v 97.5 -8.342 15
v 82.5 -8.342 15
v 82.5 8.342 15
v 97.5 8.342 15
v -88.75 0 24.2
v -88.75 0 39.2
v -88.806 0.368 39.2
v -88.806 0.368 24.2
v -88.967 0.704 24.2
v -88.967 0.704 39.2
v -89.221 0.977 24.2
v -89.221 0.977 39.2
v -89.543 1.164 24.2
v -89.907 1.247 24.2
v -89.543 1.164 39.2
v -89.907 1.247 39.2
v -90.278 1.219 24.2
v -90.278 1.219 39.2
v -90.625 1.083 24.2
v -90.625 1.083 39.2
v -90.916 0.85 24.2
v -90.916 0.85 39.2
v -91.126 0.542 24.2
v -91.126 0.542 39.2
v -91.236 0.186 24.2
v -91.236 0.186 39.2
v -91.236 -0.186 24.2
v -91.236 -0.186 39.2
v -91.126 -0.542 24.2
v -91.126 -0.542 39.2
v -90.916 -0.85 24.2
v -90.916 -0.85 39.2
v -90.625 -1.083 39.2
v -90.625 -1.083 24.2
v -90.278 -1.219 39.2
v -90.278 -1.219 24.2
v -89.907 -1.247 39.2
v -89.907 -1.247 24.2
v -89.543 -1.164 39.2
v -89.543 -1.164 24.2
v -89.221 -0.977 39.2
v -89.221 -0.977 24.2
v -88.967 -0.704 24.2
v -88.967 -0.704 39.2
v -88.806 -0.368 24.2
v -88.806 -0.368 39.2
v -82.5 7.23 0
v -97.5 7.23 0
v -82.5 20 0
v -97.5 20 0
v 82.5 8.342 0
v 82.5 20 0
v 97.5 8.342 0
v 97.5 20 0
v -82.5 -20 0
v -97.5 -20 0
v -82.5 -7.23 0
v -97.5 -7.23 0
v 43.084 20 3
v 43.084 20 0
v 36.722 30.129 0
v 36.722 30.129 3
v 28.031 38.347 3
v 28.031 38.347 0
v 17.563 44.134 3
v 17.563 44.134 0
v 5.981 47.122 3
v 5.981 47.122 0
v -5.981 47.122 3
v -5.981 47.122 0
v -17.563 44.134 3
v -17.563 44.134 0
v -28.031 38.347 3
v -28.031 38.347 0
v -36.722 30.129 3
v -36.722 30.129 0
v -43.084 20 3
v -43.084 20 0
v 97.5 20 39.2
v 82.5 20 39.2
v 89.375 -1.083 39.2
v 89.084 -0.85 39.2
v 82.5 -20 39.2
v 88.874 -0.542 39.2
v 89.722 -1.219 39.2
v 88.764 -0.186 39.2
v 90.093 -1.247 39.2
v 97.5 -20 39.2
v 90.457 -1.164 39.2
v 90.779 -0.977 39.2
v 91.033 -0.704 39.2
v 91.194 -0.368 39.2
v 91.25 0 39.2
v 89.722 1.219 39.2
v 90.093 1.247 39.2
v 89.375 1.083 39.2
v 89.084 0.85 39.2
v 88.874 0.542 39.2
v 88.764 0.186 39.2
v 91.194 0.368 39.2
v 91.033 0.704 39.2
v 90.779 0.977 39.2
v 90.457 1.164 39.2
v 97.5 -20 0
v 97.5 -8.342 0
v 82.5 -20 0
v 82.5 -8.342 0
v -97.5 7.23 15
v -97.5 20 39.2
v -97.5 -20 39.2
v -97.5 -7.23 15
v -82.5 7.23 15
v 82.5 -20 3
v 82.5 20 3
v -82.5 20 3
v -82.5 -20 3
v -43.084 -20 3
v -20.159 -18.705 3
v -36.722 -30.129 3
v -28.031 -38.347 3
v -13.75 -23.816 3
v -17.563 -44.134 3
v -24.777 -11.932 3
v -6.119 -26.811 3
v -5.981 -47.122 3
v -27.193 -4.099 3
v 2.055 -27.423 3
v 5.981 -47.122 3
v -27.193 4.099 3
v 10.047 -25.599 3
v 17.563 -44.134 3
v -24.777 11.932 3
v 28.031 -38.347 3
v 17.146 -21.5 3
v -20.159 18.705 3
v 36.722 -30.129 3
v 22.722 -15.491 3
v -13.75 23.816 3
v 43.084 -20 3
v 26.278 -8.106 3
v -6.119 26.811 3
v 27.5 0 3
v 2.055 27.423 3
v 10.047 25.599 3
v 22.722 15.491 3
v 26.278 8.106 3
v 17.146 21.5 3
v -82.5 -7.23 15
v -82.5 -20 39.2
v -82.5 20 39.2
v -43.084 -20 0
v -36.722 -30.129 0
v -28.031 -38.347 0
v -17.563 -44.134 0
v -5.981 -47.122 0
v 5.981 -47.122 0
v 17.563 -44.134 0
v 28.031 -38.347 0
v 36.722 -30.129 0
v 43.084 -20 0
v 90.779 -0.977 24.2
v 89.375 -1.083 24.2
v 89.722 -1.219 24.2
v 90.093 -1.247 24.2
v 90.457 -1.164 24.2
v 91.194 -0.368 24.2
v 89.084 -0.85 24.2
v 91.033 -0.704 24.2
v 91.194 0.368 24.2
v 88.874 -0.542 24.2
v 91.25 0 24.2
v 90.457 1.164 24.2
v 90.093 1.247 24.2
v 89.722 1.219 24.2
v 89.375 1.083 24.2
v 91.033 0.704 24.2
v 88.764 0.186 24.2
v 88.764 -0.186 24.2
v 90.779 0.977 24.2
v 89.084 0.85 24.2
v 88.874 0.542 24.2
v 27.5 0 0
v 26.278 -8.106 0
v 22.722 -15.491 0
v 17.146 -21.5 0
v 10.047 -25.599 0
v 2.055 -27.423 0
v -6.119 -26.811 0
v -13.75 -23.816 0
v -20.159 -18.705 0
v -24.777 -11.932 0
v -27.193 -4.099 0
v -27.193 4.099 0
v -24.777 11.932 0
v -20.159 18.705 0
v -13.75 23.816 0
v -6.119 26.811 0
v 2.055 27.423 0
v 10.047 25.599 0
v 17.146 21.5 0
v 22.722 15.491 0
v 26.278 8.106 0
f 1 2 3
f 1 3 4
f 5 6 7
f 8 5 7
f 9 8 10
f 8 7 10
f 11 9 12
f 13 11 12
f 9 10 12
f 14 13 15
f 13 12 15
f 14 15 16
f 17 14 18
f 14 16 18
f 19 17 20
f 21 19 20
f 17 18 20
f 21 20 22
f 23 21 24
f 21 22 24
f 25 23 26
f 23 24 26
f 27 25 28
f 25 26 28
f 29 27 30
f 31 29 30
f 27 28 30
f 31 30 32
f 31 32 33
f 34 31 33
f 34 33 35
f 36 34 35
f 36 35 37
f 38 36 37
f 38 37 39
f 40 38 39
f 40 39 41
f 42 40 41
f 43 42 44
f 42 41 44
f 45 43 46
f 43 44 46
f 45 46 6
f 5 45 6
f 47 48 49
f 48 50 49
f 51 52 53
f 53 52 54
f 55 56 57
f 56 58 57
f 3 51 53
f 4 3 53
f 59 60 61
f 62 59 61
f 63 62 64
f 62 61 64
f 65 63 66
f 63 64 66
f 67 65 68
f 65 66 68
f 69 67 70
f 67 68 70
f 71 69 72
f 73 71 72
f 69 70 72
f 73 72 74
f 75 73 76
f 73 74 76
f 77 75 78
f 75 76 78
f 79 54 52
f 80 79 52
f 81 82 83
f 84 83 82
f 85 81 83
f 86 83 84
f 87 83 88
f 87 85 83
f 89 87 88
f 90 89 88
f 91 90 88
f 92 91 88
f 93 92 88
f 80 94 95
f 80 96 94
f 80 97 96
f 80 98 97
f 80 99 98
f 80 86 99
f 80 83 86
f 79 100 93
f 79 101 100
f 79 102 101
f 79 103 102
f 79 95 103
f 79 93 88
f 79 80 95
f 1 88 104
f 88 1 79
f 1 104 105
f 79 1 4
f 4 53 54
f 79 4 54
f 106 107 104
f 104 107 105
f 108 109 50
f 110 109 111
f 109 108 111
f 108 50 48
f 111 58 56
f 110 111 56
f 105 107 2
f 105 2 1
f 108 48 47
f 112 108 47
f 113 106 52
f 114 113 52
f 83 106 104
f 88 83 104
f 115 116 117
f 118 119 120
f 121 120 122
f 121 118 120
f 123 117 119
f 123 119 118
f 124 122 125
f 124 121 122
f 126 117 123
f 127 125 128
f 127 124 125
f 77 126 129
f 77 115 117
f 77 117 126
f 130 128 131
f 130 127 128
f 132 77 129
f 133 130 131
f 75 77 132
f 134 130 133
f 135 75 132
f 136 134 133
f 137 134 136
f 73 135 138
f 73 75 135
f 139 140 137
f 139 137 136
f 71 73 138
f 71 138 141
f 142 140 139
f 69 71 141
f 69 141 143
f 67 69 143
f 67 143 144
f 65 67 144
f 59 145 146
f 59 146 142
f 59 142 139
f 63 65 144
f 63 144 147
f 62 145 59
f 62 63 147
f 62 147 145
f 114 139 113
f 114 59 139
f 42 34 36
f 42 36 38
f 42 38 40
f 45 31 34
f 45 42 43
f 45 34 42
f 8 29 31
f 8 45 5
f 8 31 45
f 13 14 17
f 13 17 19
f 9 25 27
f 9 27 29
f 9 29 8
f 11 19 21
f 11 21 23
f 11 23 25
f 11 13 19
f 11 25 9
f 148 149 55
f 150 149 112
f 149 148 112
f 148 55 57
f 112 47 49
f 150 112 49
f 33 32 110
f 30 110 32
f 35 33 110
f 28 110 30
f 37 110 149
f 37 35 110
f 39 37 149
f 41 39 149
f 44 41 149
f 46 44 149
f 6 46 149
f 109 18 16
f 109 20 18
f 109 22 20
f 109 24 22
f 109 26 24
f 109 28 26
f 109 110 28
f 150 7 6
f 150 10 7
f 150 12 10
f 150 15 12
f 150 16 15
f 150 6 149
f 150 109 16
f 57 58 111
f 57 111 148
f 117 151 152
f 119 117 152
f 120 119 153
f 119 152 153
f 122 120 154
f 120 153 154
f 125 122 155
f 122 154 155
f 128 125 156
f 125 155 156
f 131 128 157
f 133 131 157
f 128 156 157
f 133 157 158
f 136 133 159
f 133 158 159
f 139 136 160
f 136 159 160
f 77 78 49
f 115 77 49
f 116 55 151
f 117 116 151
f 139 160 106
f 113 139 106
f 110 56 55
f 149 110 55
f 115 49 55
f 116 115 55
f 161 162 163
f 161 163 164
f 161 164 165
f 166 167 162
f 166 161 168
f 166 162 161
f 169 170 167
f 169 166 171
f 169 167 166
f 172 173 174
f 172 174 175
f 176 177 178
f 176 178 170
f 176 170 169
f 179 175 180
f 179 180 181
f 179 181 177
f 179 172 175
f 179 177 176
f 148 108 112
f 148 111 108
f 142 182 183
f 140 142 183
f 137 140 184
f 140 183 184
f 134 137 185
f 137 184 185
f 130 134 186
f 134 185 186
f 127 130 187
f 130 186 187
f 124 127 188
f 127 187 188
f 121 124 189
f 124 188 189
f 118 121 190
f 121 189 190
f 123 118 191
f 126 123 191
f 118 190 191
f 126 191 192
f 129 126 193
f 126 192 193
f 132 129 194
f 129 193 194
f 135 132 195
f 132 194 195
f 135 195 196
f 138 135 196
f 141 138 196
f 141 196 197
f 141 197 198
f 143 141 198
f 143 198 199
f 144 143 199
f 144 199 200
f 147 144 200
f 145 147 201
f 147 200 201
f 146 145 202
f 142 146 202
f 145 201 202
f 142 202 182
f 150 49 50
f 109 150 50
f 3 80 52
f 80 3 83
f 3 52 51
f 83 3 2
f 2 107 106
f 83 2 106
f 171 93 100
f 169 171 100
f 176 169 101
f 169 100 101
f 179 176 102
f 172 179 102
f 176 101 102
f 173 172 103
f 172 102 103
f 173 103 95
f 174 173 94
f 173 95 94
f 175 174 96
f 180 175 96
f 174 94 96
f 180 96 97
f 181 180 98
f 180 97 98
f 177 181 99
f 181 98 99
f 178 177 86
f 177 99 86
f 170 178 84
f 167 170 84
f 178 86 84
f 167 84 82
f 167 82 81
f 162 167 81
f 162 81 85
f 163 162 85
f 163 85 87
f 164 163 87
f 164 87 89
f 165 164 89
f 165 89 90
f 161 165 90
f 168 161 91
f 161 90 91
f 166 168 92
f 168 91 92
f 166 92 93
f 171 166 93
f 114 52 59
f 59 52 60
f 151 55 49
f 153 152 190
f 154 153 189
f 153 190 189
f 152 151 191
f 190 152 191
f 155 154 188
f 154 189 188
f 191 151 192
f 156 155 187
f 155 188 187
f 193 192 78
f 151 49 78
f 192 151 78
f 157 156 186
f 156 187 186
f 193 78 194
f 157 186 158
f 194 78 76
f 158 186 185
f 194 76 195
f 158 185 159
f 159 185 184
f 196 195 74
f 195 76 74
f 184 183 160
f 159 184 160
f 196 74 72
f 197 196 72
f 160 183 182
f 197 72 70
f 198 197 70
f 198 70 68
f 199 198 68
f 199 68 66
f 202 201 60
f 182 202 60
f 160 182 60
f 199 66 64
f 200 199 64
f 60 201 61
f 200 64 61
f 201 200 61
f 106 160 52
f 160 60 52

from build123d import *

# Parameters (mm, degrees)
F1_DEPTH  = 39.2
F2_DEPTH  = 3
F3_W      = 15
F3_H      = 7.229873
F4_DEPTH  = 15
F5_W      = 15
F5_H      = 8.342162
F6_DEPTH  = 15
F7_R      = 1.25
F8_DEPTH  = 15
F9_R      = 1.25
F10_DEPTH = 15


with BuildPart() as f1:
    # F0 (on Top) → F1 (new body)
    with BuildSketch(Plane.XY):
        Polygon((-82.5, -20), (-82.5, 0), (-82.5, 20), (-97.5, 20), (-97.5, -20), align=None)
        Polygon((82.5, 20), (82.5, 0), (82.5, -20), (97.5, -20), (97.5, 20), align=None)
    extrude(amount=F1_DEPTH)

    # F3 (on face) → F4 (cut)
    with BuildSketch(Plane(origin=(0, 0, 0), x_dir=(1, 0, 0), z_dir=(0, 0, -1))):
        with Locations((-90, -3.614936)):
            Rectangle(F3_W, F3_H)
        with Locations((-90, 3.614936)):
            Rectangle(F3_W, F3_H)
    extrude(amount=-F4_DEPTH, mode=Mode.SUBTRACT)

    # F5 (on face) → F6 (cut)
    with BuildSketch(Plane(origin=(0, 0, 0), x_dir=(1, 0, 0), z_dir=(0, 0, -1))):
        with Locations((90, 4.171081)):
            Rectangle(F5_W, F5_H)
        with Locations((90, -4.171081)):
            Rectangle(F5_W, F5_H)
    extrude(amount=-F6_DEPTH, mode=Mode.SUBTRACT)

    # F7 (on face) → F8 (cut)
    with BuildSketch(Plane.XY.offset(39.2)):
        with Locations((-90, 0)):
            Circle(F7_R)
    extrude(amount=-F8_DEPTH, mode=Mode.SUBTRACT)

    # F9 (on face) → F10 (cut)
    with BuildSketch(Plane.XY.offset(39.2)):
        with Locations((90, 0)):
            Circle(F9_R)
    extrude(amount=-F10_DEPTH, mode=Mode.SUBTRACT)


with BuildPart() as f2:
    # F0 (on Top) → F2 (new body)
    with BuildSketch(Plane.XY):
        with BuildLine():
            ThreePointArc((43.08422, 20), (46.38292, 10.240839), (47.5, 0))
            Line((47.5, 0), (82.5, 0))
            Line((82.5, 0), (82.5, 20))
            Line((82.5, 20), (43.08422, 20))
        make_face()
        with BuildLine():
            Line((82.5, 0), (47.5, 0))
            ThreePointArc((47.5, 0), (46.38292, -10.240839), (43.08422, -20))
            Line((43.08422, -20), (82.5, -20))
            Line((82.5, -20), (82.5, 0))
        make_face()
        with BuildLine():
            ThreePointArc((-27.5, 0), (0, 27.5), (27.5, 0))
            Line((27.5, 0), (47.5, 0))
            ThreePointArc((47.5, 0), (46.38292, 10.240839), (43.08422, 20))
            ThreePointArc((43.08422, 20), (0, 47.5), (-43.08422, 20))
            ThreePointArc((-43.08422, 20), (-46.38292, 10.240839), (-47.5, 0))
            Line((-47.5, 0), (-27.5, 0))
        make_face()
        with BuildLine():
            Line((47.5, 0), (27.5, 0))
            ThreePointArc((27.5, 0), (0, -27.5), (-27.5, 0))
            Line((-27.5, 0), (-47.5, 0))
            ThreePointArc((-47.5, 0), (-46.38292, -10.240839), (-43.08422, -20))
            ThreePointArc((-43.08422, -20), (0, -47.5), (43.08422, -20))
            ThreePointArc((43.08422, -20), (46.38292, -10.240839), (47.5, 0))
        make_face()
        with BuildLine():
            Line((-82.5, 0), (-47.5, 0))
            ThreePointArc((-47.5, 0), (-46.38292, 10.240839), (-43.08422, 20))
            Line((-43.08422, 20), (-82.5, 20))
            Line((-82.5, 20), (-82.5, 0))
        make_face()
        with BuildLine():
            ThreePointArc((-43.08422, -20), (-46.38292, -10.240839), (-47.5, 0))
            Line((-47.5, 0), (-82.5, 0))
            Line((-82.5, 0), (-82.5, -20))
            Line((-82.5, -20), (-43.08422, -20))
        make_face()
    extrude(amount=F2_DEPTH)


solid = Compound([f1.part, f2.part])
